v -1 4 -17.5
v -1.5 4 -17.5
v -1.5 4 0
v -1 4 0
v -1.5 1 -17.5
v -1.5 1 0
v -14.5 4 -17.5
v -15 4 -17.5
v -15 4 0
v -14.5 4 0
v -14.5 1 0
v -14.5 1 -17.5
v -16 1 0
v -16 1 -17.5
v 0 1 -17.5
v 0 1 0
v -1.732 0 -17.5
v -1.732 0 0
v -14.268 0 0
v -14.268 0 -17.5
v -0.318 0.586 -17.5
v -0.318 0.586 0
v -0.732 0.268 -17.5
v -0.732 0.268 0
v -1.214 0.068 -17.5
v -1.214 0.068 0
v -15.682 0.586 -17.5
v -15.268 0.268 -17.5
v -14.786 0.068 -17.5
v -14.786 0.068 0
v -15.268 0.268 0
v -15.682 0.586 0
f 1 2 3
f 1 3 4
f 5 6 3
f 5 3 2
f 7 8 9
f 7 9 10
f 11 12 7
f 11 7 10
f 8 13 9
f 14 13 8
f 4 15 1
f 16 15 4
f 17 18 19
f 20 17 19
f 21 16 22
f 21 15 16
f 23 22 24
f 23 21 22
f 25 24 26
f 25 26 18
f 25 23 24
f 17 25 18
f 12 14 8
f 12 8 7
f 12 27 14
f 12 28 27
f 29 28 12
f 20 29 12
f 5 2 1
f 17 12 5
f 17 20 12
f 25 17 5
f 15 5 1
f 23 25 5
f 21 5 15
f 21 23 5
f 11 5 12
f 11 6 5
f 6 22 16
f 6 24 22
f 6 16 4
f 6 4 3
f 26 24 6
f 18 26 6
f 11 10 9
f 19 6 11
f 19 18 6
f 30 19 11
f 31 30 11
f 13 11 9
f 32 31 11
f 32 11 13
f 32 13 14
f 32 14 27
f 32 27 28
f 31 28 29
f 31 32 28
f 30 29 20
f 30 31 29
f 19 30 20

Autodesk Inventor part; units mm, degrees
ref_plane "YZ Plane" through (0, 0, 0) normal (1, 0, 0) x (0, 1, 0)
ref_plane "XZ Plane" through (0, 0, 0) normal (0, 1, 0) x (-1, 0, 0)
ref_plane "XY Plane" through (0, 0, 0) normal (0, 0, 1) x (1, 0, 0)
sketch "스케치1" plane through (0, 0, 0) normal (0, 1, 0) x (-1, 0, 0)
  line L0 (0, 0) -> (16, 0)
  line L1 (16, 0) -> (16, -17.5)
  line L2 (16, -17.5) -> (0, -17.5)
  line L3 (0, -17.5) -> (0, 0)
  dimension "d0" = 16
  dimension "d1" = 17.5
extrude "돌출1" add sketch "스케치1" along normal blind 1
sketch "스케치2" plane through (0, 1, 0) normal (0, 1, 0) x (1, 0, 0)
  line L0 (-16, 0) -> (0, 0) projected
  line L1 (0, 0) -> (0, 17.5) projected
  line L2 (0, 17.5) -> (-16, 17.5) projected
  line L3 (-16, 17.5) -> (-16, 0) projected
  line L4 (-16, 0) -> (0, 0) projected
  line L5 (-16, 17.5) -> (-14.5, 17.5)
  line L6 (-14.5, 17.5) -> (-14.5, 0)
  line L7 (-14.5, 0) -> (-16, 0)
  line L8 (-16, 0) -> (-16, 17.5)
  line L9 (0, 17.5) -> (-16, 17.5) projected
  line L10 (0, 0) -> (-1.5, 0)
  line L11 (-1.5, 0) -> (-1.5, 17.5)
  line L12 (-1.5, 17.5) -> (0, 17.5)
  line L13 (0, 17.5) -> (0, 0)
  point P0 (-1.5, 0)
  point P1 (-14.5, 0)
  dimension "d4" = 1.5
  dimension "d5" = 1.5
extrude "돌출2" add sketch "스케치2" along normal blind 3 contours L3 L2 L6 L0 | L11 L2 L1 L0
chamfer "모따기1" distance 1 distance2 3 1 edges at (0, 4, -8.75) measured on face at (-1, 4, -11.6667)
chamfer "모따기2" distance 1 distance2 3 1 edges at (-16, 4, -8.75) measured on face at (-15, 4, -5.8333)
fillet "모깎기1" radius 2 2 edges at (-16, 0, -8.75) (0, 0, -8.75)
properties part number "_3D 인쇄"
